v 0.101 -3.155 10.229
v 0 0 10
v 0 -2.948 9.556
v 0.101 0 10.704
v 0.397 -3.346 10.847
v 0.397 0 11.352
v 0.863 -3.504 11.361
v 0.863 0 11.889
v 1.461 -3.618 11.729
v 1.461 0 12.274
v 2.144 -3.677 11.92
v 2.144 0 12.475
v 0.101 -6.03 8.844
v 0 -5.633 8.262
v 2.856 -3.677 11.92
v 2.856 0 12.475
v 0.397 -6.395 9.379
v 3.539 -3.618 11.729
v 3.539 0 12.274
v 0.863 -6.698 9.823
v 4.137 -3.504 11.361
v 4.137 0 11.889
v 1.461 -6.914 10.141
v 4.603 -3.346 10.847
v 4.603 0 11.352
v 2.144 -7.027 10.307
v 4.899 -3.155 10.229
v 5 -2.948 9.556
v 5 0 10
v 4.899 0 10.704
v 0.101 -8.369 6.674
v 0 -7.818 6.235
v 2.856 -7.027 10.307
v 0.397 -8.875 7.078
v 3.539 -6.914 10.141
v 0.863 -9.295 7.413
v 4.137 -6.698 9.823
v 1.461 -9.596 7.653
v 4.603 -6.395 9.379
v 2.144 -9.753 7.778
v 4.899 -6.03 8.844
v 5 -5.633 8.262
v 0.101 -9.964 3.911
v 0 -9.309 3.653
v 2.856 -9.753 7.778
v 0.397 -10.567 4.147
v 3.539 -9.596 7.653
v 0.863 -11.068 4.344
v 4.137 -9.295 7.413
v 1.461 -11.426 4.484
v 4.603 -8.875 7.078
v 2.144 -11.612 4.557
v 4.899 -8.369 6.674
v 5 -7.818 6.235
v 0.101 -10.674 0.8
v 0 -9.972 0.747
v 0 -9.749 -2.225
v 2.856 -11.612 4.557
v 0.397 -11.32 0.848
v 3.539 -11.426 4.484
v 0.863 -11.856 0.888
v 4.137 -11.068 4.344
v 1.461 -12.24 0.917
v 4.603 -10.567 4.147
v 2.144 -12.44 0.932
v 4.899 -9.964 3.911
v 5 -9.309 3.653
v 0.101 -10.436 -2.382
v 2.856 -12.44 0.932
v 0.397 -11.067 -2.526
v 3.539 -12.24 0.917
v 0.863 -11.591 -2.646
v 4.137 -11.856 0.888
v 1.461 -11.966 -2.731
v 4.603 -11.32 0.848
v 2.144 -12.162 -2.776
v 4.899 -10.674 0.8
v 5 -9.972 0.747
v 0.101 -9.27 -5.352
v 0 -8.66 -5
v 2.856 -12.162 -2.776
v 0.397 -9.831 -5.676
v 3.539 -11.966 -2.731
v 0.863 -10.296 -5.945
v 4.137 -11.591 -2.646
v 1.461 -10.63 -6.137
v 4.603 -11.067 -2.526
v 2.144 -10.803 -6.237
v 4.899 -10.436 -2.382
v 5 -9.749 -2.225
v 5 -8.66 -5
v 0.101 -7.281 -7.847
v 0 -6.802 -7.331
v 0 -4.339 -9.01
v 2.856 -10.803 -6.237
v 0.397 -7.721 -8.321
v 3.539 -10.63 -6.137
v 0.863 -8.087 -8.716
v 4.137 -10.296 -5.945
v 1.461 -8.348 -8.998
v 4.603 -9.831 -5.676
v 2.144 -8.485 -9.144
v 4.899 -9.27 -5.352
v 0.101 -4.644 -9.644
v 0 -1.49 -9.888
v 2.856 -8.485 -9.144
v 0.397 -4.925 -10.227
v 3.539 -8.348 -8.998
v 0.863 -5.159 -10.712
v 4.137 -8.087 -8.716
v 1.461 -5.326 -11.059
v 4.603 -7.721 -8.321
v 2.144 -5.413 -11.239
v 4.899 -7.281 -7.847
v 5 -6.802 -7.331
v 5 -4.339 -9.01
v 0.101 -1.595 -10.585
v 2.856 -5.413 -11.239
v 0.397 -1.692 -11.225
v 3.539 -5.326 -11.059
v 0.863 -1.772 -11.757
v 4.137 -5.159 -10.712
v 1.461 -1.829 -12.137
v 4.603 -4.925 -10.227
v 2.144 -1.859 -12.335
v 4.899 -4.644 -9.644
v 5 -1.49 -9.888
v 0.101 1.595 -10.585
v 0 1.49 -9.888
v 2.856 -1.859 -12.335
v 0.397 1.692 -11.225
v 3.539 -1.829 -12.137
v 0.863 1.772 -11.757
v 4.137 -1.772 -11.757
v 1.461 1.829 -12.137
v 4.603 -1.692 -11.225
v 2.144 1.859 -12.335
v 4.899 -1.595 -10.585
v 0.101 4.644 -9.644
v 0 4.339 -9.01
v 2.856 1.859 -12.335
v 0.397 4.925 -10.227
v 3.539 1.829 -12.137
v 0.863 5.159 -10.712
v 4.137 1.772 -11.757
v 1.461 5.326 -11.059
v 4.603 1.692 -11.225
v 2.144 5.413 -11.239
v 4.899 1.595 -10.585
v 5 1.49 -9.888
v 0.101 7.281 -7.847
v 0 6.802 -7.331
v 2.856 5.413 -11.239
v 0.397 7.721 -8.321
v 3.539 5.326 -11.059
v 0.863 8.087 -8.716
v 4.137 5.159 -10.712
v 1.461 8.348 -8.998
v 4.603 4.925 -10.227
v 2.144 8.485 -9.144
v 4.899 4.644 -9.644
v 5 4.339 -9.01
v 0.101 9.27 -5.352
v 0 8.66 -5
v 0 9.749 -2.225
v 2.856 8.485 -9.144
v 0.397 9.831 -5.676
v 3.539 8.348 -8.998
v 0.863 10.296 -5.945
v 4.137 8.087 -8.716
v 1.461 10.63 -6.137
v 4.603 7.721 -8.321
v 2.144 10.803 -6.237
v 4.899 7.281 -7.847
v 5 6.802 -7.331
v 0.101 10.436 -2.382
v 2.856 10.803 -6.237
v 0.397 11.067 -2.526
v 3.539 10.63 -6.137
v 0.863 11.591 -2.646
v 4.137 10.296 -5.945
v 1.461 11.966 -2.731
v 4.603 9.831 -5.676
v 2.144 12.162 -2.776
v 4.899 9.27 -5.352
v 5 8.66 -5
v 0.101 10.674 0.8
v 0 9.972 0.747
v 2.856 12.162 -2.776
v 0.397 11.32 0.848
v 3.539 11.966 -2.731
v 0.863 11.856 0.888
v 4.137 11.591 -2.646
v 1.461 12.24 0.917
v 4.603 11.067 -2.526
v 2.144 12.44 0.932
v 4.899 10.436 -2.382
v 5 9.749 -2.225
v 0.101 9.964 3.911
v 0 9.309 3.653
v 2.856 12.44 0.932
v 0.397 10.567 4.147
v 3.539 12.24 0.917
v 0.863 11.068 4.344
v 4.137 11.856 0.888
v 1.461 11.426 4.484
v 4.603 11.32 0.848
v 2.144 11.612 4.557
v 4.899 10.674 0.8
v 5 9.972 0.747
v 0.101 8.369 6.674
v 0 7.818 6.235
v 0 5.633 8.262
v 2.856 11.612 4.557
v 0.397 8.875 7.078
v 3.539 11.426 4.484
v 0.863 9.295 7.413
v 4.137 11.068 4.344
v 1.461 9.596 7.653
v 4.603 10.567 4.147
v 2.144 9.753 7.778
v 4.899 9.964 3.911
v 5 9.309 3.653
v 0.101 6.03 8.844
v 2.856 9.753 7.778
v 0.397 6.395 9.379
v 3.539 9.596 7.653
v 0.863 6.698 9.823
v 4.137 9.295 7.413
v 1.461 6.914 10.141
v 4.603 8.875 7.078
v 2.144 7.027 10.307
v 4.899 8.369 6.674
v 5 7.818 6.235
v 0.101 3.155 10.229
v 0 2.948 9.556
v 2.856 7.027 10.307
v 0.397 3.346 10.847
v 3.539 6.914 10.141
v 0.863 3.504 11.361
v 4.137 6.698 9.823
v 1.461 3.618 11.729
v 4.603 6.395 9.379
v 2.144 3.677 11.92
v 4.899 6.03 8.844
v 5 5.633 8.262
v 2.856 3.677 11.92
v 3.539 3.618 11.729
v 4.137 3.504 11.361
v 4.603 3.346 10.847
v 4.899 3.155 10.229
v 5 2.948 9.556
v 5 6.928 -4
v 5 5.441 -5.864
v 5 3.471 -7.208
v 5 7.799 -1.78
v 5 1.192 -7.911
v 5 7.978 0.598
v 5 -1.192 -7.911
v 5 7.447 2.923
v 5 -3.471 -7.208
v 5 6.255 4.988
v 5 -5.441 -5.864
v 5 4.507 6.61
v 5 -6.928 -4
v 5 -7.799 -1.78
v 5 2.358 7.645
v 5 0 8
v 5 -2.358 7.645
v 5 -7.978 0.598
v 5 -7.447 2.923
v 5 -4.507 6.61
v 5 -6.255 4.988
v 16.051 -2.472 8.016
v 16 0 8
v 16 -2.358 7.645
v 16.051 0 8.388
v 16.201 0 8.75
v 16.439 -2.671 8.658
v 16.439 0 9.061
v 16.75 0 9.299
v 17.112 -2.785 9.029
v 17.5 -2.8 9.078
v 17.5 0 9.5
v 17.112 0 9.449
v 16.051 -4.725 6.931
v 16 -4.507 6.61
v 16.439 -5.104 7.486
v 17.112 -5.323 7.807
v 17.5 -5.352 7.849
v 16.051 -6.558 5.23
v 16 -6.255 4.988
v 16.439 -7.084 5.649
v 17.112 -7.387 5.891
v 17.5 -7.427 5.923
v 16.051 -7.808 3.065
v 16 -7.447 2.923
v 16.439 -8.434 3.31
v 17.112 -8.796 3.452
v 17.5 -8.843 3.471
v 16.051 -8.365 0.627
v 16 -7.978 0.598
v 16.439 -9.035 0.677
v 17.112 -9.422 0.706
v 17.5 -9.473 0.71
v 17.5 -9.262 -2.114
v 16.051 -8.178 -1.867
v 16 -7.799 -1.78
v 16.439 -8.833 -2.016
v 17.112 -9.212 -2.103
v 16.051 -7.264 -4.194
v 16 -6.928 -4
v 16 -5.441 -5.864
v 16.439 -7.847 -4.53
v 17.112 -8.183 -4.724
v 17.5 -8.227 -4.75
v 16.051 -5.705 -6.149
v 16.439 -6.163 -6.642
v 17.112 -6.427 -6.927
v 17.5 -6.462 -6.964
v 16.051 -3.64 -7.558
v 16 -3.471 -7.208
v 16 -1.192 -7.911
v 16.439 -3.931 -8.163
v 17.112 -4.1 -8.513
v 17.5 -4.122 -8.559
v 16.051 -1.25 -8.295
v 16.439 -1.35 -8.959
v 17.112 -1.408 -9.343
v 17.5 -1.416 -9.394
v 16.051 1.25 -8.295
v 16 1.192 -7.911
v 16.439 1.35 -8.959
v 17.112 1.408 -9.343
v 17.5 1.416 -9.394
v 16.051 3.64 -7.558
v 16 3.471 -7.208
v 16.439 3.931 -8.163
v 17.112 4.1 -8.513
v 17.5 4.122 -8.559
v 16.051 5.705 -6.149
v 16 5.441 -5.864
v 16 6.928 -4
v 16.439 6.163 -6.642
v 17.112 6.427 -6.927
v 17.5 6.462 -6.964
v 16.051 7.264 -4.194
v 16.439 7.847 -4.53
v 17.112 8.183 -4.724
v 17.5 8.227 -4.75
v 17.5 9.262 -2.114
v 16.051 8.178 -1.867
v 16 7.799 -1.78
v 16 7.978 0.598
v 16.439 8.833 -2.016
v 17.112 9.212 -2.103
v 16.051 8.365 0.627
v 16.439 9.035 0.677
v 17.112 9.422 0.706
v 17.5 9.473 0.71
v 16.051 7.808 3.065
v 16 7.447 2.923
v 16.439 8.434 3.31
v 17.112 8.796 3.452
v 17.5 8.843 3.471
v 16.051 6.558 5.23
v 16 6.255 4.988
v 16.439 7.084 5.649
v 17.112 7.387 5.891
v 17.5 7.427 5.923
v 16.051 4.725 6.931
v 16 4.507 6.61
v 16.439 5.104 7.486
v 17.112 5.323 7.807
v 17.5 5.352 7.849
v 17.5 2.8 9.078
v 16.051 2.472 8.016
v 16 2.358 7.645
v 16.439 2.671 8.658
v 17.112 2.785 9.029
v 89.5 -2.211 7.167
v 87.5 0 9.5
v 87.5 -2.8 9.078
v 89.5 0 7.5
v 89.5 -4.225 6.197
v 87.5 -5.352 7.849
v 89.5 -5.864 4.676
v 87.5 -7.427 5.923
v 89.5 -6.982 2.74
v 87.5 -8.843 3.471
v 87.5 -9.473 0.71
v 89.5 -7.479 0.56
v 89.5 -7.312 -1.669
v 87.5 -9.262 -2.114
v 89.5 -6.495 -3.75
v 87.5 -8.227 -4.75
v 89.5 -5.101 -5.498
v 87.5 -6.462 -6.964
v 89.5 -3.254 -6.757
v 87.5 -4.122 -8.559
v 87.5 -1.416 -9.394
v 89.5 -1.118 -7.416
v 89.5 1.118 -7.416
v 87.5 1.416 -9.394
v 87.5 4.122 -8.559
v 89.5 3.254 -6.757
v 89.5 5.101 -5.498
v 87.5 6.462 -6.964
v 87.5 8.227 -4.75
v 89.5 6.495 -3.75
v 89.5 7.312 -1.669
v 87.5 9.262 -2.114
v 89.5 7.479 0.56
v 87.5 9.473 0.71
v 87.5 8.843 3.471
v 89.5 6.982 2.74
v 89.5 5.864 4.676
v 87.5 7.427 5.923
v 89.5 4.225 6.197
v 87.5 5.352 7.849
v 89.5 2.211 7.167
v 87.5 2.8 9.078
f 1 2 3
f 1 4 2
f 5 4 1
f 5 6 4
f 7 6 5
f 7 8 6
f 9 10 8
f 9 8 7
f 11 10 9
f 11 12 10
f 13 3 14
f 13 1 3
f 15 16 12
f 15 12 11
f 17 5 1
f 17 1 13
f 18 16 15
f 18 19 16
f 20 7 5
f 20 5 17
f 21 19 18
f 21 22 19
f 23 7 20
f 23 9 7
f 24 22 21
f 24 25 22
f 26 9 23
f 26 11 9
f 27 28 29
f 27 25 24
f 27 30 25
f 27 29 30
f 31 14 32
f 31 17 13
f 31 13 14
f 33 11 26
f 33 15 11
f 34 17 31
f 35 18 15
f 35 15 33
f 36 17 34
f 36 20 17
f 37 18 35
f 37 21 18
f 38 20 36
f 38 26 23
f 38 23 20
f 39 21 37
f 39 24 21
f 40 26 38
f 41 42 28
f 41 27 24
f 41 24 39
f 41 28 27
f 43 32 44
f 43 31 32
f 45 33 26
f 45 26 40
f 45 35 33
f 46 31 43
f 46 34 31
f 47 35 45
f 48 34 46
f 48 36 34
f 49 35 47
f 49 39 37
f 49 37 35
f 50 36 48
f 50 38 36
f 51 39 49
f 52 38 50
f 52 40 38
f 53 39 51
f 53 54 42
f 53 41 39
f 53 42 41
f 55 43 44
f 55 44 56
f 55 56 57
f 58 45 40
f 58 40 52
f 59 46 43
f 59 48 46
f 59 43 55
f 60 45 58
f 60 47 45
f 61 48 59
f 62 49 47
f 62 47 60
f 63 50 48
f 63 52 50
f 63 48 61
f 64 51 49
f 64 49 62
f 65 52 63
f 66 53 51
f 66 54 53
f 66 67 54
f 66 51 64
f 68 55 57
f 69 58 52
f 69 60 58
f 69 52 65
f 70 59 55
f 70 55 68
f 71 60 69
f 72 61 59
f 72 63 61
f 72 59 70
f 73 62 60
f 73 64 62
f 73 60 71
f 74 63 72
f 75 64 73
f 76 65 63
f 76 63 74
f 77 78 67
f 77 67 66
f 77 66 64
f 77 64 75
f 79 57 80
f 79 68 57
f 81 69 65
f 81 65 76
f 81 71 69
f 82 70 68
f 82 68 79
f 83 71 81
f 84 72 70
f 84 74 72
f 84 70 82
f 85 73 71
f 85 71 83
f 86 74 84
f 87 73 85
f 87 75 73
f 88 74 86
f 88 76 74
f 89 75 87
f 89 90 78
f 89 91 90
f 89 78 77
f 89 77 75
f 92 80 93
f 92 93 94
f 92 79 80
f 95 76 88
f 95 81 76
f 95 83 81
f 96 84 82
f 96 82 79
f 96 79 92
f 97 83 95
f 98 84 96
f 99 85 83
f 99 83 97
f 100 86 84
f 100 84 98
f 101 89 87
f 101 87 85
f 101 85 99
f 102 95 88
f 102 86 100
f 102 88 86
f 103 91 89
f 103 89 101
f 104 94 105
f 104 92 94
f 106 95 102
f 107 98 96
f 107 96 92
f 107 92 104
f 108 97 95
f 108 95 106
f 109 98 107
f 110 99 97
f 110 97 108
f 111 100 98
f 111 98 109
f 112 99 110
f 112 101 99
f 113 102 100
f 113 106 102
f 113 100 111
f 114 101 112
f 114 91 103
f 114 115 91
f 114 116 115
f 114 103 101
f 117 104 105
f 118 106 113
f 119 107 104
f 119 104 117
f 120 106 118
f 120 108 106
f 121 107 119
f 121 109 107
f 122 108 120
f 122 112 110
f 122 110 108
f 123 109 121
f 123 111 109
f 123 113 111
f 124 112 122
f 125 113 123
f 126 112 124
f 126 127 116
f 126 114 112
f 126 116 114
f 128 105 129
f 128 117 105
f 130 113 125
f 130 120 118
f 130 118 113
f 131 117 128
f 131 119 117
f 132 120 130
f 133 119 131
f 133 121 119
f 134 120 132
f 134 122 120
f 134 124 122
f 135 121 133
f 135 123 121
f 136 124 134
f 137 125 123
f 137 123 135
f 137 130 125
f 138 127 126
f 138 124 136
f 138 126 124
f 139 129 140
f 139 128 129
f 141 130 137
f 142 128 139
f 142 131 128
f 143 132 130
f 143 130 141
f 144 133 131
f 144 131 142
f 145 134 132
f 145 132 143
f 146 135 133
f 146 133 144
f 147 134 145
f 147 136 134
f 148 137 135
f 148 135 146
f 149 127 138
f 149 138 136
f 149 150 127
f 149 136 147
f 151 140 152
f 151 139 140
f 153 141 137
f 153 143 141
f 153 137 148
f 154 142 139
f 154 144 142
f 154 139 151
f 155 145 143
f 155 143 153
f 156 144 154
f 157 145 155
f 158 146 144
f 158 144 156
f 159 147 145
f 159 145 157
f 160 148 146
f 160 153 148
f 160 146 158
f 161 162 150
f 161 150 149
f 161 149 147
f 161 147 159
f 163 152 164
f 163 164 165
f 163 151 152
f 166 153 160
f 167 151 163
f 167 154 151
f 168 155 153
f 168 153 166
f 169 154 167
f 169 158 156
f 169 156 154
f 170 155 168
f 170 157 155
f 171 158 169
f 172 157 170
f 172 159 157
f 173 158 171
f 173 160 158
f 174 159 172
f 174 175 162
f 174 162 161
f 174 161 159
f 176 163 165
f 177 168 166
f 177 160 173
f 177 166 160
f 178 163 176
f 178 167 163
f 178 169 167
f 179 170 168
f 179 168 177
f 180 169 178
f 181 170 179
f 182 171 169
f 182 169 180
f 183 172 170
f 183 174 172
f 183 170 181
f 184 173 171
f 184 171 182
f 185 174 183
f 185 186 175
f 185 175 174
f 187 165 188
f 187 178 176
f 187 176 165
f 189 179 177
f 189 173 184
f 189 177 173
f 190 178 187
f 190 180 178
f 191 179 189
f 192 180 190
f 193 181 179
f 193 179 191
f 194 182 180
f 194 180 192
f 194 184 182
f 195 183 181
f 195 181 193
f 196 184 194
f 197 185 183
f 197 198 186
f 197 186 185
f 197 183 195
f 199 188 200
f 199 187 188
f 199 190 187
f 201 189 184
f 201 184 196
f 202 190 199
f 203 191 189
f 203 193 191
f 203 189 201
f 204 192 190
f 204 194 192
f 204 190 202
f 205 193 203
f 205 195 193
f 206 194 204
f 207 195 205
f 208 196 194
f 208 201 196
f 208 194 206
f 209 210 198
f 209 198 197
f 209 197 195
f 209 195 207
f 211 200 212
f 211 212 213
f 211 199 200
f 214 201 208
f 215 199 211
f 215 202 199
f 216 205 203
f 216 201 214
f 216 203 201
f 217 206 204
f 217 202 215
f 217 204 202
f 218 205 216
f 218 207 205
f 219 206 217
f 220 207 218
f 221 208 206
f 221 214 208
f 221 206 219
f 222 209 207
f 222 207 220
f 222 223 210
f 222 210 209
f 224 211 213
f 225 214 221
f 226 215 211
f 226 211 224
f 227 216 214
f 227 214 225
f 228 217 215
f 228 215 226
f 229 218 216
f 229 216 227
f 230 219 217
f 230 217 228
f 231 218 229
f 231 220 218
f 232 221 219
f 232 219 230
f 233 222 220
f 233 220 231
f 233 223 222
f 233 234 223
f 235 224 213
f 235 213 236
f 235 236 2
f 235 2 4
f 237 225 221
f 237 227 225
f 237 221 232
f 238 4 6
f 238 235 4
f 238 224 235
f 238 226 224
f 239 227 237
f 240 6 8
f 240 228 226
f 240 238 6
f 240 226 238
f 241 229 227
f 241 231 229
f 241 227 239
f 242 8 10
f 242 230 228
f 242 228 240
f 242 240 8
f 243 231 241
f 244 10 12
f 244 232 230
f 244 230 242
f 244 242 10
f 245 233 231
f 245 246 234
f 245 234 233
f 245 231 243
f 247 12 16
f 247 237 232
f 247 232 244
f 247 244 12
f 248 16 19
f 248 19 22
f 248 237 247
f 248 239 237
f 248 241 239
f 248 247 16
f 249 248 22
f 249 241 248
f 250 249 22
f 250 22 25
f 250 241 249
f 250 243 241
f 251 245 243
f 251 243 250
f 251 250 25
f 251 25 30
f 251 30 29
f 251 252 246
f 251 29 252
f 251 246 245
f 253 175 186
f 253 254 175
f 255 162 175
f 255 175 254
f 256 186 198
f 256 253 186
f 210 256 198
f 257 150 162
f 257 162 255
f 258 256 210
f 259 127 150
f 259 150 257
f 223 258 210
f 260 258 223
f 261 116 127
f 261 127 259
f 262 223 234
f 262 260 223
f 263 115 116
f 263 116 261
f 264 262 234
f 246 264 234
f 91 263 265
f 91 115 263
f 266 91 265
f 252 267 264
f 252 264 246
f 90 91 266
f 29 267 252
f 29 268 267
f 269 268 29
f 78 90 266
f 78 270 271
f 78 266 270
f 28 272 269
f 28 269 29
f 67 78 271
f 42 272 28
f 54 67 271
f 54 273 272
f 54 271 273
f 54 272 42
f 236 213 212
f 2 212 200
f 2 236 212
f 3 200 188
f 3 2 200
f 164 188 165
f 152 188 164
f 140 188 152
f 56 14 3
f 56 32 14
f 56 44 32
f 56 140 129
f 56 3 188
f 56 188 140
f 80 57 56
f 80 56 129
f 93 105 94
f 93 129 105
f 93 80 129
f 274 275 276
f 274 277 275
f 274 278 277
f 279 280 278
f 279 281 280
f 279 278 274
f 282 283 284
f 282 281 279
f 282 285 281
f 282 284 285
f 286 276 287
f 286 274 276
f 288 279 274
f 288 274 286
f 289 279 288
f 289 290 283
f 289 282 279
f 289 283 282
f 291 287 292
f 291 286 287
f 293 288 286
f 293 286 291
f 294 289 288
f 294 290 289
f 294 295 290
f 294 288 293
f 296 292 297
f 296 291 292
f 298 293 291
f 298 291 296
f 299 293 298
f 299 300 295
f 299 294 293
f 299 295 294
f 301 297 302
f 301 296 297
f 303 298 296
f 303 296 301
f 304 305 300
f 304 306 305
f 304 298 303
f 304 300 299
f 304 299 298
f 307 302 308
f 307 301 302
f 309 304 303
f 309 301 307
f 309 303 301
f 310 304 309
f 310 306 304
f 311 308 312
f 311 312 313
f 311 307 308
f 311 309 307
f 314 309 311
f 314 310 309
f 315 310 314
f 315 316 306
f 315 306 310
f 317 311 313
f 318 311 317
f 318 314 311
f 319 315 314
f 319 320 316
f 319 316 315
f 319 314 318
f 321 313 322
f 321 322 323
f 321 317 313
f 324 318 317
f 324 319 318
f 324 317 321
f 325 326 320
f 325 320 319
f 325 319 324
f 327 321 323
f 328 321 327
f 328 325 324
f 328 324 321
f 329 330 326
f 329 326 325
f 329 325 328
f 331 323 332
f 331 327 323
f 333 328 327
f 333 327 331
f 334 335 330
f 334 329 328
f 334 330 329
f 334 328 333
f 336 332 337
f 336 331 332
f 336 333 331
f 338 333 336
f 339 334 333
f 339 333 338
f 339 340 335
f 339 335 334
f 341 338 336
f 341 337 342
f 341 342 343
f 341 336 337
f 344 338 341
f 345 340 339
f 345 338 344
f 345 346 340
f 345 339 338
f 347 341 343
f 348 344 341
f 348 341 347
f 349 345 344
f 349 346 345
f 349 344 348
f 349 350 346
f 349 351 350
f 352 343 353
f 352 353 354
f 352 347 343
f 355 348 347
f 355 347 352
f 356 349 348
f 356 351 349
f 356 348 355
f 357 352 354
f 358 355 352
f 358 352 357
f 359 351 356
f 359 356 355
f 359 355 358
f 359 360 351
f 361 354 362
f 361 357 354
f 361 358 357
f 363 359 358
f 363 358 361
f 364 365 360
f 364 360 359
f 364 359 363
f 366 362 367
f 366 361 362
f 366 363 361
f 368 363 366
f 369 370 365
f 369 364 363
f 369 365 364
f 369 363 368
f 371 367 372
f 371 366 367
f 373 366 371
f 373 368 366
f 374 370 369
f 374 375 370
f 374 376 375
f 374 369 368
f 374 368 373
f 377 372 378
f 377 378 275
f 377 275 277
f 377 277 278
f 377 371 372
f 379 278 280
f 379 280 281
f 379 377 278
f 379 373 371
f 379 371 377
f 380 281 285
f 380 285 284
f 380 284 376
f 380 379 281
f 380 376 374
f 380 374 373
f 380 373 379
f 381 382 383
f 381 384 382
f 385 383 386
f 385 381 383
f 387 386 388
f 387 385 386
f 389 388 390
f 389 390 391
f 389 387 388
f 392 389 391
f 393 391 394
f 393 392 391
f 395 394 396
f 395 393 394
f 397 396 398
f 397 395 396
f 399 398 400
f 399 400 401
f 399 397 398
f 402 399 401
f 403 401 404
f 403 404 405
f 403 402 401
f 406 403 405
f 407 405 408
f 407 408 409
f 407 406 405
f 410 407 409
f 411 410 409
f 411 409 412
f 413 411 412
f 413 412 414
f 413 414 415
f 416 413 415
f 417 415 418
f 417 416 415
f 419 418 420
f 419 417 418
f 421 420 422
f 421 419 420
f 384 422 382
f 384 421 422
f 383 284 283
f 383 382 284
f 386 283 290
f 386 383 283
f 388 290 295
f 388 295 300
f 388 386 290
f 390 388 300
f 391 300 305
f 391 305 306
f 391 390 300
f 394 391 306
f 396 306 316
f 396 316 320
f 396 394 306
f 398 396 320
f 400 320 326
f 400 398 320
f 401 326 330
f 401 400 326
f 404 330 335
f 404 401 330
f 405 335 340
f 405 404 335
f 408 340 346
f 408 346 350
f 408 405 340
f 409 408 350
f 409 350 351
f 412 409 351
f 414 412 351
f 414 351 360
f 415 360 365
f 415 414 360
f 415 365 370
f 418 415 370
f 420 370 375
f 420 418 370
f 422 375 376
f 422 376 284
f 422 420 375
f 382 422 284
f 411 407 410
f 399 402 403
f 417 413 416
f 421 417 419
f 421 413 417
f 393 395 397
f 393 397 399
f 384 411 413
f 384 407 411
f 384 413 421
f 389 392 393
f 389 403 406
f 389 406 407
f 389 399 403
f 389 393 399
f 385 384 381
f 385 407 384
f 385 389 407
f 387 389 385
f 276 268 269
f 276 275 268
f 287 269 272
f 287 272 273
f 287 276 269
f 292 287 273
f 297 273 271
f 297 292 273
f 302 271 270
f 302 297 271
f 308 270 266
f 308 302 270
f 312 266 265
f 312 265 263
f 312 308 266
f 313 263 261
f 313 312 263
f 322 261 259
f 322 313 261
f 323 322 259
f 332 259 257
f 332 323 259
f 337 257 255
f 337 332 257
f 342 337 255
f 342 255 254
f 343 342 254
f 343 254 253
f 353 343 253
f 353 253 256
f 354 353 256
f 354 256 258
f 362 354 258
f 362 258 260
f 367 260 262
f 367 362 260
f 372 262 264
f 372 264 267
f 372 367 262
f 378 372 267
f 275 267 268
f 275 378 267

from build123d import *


with BuildPart() as part:
    # Sketch1 → Revolve1 (revolve)
    with BuildSketch(Plane.XY, mode=Mode.PRIVATE) as revolve1_sk:
        with BuildLine():
            Line((0, 0), (0, 10))
            ThreePointArc((0, 10), (2.5, 12.5), (5, 10))
            Line((5, 10), (5, 8))
            Line((5, 8), (16, 8))
            ThreePointArc((16, 8), (16.439339828, 9.060660172), (17.5, 9.5))
            Line((17.5, 9.5), (87.5, 9.5))
            Line((87.5, 9.5), (89.5, 7.5))
            Line((89.5, 7.5), (89.5, 0))
            Line((89.5, 0), (0, 0))
        make_face()
    revolve(revolve1_sk.sketch.rotate(Axis((0, 0, 0), (1, 0, 0)), 90), axis=Axis((0, 0, 0), (1, 0, 0)))


solid = part.part
